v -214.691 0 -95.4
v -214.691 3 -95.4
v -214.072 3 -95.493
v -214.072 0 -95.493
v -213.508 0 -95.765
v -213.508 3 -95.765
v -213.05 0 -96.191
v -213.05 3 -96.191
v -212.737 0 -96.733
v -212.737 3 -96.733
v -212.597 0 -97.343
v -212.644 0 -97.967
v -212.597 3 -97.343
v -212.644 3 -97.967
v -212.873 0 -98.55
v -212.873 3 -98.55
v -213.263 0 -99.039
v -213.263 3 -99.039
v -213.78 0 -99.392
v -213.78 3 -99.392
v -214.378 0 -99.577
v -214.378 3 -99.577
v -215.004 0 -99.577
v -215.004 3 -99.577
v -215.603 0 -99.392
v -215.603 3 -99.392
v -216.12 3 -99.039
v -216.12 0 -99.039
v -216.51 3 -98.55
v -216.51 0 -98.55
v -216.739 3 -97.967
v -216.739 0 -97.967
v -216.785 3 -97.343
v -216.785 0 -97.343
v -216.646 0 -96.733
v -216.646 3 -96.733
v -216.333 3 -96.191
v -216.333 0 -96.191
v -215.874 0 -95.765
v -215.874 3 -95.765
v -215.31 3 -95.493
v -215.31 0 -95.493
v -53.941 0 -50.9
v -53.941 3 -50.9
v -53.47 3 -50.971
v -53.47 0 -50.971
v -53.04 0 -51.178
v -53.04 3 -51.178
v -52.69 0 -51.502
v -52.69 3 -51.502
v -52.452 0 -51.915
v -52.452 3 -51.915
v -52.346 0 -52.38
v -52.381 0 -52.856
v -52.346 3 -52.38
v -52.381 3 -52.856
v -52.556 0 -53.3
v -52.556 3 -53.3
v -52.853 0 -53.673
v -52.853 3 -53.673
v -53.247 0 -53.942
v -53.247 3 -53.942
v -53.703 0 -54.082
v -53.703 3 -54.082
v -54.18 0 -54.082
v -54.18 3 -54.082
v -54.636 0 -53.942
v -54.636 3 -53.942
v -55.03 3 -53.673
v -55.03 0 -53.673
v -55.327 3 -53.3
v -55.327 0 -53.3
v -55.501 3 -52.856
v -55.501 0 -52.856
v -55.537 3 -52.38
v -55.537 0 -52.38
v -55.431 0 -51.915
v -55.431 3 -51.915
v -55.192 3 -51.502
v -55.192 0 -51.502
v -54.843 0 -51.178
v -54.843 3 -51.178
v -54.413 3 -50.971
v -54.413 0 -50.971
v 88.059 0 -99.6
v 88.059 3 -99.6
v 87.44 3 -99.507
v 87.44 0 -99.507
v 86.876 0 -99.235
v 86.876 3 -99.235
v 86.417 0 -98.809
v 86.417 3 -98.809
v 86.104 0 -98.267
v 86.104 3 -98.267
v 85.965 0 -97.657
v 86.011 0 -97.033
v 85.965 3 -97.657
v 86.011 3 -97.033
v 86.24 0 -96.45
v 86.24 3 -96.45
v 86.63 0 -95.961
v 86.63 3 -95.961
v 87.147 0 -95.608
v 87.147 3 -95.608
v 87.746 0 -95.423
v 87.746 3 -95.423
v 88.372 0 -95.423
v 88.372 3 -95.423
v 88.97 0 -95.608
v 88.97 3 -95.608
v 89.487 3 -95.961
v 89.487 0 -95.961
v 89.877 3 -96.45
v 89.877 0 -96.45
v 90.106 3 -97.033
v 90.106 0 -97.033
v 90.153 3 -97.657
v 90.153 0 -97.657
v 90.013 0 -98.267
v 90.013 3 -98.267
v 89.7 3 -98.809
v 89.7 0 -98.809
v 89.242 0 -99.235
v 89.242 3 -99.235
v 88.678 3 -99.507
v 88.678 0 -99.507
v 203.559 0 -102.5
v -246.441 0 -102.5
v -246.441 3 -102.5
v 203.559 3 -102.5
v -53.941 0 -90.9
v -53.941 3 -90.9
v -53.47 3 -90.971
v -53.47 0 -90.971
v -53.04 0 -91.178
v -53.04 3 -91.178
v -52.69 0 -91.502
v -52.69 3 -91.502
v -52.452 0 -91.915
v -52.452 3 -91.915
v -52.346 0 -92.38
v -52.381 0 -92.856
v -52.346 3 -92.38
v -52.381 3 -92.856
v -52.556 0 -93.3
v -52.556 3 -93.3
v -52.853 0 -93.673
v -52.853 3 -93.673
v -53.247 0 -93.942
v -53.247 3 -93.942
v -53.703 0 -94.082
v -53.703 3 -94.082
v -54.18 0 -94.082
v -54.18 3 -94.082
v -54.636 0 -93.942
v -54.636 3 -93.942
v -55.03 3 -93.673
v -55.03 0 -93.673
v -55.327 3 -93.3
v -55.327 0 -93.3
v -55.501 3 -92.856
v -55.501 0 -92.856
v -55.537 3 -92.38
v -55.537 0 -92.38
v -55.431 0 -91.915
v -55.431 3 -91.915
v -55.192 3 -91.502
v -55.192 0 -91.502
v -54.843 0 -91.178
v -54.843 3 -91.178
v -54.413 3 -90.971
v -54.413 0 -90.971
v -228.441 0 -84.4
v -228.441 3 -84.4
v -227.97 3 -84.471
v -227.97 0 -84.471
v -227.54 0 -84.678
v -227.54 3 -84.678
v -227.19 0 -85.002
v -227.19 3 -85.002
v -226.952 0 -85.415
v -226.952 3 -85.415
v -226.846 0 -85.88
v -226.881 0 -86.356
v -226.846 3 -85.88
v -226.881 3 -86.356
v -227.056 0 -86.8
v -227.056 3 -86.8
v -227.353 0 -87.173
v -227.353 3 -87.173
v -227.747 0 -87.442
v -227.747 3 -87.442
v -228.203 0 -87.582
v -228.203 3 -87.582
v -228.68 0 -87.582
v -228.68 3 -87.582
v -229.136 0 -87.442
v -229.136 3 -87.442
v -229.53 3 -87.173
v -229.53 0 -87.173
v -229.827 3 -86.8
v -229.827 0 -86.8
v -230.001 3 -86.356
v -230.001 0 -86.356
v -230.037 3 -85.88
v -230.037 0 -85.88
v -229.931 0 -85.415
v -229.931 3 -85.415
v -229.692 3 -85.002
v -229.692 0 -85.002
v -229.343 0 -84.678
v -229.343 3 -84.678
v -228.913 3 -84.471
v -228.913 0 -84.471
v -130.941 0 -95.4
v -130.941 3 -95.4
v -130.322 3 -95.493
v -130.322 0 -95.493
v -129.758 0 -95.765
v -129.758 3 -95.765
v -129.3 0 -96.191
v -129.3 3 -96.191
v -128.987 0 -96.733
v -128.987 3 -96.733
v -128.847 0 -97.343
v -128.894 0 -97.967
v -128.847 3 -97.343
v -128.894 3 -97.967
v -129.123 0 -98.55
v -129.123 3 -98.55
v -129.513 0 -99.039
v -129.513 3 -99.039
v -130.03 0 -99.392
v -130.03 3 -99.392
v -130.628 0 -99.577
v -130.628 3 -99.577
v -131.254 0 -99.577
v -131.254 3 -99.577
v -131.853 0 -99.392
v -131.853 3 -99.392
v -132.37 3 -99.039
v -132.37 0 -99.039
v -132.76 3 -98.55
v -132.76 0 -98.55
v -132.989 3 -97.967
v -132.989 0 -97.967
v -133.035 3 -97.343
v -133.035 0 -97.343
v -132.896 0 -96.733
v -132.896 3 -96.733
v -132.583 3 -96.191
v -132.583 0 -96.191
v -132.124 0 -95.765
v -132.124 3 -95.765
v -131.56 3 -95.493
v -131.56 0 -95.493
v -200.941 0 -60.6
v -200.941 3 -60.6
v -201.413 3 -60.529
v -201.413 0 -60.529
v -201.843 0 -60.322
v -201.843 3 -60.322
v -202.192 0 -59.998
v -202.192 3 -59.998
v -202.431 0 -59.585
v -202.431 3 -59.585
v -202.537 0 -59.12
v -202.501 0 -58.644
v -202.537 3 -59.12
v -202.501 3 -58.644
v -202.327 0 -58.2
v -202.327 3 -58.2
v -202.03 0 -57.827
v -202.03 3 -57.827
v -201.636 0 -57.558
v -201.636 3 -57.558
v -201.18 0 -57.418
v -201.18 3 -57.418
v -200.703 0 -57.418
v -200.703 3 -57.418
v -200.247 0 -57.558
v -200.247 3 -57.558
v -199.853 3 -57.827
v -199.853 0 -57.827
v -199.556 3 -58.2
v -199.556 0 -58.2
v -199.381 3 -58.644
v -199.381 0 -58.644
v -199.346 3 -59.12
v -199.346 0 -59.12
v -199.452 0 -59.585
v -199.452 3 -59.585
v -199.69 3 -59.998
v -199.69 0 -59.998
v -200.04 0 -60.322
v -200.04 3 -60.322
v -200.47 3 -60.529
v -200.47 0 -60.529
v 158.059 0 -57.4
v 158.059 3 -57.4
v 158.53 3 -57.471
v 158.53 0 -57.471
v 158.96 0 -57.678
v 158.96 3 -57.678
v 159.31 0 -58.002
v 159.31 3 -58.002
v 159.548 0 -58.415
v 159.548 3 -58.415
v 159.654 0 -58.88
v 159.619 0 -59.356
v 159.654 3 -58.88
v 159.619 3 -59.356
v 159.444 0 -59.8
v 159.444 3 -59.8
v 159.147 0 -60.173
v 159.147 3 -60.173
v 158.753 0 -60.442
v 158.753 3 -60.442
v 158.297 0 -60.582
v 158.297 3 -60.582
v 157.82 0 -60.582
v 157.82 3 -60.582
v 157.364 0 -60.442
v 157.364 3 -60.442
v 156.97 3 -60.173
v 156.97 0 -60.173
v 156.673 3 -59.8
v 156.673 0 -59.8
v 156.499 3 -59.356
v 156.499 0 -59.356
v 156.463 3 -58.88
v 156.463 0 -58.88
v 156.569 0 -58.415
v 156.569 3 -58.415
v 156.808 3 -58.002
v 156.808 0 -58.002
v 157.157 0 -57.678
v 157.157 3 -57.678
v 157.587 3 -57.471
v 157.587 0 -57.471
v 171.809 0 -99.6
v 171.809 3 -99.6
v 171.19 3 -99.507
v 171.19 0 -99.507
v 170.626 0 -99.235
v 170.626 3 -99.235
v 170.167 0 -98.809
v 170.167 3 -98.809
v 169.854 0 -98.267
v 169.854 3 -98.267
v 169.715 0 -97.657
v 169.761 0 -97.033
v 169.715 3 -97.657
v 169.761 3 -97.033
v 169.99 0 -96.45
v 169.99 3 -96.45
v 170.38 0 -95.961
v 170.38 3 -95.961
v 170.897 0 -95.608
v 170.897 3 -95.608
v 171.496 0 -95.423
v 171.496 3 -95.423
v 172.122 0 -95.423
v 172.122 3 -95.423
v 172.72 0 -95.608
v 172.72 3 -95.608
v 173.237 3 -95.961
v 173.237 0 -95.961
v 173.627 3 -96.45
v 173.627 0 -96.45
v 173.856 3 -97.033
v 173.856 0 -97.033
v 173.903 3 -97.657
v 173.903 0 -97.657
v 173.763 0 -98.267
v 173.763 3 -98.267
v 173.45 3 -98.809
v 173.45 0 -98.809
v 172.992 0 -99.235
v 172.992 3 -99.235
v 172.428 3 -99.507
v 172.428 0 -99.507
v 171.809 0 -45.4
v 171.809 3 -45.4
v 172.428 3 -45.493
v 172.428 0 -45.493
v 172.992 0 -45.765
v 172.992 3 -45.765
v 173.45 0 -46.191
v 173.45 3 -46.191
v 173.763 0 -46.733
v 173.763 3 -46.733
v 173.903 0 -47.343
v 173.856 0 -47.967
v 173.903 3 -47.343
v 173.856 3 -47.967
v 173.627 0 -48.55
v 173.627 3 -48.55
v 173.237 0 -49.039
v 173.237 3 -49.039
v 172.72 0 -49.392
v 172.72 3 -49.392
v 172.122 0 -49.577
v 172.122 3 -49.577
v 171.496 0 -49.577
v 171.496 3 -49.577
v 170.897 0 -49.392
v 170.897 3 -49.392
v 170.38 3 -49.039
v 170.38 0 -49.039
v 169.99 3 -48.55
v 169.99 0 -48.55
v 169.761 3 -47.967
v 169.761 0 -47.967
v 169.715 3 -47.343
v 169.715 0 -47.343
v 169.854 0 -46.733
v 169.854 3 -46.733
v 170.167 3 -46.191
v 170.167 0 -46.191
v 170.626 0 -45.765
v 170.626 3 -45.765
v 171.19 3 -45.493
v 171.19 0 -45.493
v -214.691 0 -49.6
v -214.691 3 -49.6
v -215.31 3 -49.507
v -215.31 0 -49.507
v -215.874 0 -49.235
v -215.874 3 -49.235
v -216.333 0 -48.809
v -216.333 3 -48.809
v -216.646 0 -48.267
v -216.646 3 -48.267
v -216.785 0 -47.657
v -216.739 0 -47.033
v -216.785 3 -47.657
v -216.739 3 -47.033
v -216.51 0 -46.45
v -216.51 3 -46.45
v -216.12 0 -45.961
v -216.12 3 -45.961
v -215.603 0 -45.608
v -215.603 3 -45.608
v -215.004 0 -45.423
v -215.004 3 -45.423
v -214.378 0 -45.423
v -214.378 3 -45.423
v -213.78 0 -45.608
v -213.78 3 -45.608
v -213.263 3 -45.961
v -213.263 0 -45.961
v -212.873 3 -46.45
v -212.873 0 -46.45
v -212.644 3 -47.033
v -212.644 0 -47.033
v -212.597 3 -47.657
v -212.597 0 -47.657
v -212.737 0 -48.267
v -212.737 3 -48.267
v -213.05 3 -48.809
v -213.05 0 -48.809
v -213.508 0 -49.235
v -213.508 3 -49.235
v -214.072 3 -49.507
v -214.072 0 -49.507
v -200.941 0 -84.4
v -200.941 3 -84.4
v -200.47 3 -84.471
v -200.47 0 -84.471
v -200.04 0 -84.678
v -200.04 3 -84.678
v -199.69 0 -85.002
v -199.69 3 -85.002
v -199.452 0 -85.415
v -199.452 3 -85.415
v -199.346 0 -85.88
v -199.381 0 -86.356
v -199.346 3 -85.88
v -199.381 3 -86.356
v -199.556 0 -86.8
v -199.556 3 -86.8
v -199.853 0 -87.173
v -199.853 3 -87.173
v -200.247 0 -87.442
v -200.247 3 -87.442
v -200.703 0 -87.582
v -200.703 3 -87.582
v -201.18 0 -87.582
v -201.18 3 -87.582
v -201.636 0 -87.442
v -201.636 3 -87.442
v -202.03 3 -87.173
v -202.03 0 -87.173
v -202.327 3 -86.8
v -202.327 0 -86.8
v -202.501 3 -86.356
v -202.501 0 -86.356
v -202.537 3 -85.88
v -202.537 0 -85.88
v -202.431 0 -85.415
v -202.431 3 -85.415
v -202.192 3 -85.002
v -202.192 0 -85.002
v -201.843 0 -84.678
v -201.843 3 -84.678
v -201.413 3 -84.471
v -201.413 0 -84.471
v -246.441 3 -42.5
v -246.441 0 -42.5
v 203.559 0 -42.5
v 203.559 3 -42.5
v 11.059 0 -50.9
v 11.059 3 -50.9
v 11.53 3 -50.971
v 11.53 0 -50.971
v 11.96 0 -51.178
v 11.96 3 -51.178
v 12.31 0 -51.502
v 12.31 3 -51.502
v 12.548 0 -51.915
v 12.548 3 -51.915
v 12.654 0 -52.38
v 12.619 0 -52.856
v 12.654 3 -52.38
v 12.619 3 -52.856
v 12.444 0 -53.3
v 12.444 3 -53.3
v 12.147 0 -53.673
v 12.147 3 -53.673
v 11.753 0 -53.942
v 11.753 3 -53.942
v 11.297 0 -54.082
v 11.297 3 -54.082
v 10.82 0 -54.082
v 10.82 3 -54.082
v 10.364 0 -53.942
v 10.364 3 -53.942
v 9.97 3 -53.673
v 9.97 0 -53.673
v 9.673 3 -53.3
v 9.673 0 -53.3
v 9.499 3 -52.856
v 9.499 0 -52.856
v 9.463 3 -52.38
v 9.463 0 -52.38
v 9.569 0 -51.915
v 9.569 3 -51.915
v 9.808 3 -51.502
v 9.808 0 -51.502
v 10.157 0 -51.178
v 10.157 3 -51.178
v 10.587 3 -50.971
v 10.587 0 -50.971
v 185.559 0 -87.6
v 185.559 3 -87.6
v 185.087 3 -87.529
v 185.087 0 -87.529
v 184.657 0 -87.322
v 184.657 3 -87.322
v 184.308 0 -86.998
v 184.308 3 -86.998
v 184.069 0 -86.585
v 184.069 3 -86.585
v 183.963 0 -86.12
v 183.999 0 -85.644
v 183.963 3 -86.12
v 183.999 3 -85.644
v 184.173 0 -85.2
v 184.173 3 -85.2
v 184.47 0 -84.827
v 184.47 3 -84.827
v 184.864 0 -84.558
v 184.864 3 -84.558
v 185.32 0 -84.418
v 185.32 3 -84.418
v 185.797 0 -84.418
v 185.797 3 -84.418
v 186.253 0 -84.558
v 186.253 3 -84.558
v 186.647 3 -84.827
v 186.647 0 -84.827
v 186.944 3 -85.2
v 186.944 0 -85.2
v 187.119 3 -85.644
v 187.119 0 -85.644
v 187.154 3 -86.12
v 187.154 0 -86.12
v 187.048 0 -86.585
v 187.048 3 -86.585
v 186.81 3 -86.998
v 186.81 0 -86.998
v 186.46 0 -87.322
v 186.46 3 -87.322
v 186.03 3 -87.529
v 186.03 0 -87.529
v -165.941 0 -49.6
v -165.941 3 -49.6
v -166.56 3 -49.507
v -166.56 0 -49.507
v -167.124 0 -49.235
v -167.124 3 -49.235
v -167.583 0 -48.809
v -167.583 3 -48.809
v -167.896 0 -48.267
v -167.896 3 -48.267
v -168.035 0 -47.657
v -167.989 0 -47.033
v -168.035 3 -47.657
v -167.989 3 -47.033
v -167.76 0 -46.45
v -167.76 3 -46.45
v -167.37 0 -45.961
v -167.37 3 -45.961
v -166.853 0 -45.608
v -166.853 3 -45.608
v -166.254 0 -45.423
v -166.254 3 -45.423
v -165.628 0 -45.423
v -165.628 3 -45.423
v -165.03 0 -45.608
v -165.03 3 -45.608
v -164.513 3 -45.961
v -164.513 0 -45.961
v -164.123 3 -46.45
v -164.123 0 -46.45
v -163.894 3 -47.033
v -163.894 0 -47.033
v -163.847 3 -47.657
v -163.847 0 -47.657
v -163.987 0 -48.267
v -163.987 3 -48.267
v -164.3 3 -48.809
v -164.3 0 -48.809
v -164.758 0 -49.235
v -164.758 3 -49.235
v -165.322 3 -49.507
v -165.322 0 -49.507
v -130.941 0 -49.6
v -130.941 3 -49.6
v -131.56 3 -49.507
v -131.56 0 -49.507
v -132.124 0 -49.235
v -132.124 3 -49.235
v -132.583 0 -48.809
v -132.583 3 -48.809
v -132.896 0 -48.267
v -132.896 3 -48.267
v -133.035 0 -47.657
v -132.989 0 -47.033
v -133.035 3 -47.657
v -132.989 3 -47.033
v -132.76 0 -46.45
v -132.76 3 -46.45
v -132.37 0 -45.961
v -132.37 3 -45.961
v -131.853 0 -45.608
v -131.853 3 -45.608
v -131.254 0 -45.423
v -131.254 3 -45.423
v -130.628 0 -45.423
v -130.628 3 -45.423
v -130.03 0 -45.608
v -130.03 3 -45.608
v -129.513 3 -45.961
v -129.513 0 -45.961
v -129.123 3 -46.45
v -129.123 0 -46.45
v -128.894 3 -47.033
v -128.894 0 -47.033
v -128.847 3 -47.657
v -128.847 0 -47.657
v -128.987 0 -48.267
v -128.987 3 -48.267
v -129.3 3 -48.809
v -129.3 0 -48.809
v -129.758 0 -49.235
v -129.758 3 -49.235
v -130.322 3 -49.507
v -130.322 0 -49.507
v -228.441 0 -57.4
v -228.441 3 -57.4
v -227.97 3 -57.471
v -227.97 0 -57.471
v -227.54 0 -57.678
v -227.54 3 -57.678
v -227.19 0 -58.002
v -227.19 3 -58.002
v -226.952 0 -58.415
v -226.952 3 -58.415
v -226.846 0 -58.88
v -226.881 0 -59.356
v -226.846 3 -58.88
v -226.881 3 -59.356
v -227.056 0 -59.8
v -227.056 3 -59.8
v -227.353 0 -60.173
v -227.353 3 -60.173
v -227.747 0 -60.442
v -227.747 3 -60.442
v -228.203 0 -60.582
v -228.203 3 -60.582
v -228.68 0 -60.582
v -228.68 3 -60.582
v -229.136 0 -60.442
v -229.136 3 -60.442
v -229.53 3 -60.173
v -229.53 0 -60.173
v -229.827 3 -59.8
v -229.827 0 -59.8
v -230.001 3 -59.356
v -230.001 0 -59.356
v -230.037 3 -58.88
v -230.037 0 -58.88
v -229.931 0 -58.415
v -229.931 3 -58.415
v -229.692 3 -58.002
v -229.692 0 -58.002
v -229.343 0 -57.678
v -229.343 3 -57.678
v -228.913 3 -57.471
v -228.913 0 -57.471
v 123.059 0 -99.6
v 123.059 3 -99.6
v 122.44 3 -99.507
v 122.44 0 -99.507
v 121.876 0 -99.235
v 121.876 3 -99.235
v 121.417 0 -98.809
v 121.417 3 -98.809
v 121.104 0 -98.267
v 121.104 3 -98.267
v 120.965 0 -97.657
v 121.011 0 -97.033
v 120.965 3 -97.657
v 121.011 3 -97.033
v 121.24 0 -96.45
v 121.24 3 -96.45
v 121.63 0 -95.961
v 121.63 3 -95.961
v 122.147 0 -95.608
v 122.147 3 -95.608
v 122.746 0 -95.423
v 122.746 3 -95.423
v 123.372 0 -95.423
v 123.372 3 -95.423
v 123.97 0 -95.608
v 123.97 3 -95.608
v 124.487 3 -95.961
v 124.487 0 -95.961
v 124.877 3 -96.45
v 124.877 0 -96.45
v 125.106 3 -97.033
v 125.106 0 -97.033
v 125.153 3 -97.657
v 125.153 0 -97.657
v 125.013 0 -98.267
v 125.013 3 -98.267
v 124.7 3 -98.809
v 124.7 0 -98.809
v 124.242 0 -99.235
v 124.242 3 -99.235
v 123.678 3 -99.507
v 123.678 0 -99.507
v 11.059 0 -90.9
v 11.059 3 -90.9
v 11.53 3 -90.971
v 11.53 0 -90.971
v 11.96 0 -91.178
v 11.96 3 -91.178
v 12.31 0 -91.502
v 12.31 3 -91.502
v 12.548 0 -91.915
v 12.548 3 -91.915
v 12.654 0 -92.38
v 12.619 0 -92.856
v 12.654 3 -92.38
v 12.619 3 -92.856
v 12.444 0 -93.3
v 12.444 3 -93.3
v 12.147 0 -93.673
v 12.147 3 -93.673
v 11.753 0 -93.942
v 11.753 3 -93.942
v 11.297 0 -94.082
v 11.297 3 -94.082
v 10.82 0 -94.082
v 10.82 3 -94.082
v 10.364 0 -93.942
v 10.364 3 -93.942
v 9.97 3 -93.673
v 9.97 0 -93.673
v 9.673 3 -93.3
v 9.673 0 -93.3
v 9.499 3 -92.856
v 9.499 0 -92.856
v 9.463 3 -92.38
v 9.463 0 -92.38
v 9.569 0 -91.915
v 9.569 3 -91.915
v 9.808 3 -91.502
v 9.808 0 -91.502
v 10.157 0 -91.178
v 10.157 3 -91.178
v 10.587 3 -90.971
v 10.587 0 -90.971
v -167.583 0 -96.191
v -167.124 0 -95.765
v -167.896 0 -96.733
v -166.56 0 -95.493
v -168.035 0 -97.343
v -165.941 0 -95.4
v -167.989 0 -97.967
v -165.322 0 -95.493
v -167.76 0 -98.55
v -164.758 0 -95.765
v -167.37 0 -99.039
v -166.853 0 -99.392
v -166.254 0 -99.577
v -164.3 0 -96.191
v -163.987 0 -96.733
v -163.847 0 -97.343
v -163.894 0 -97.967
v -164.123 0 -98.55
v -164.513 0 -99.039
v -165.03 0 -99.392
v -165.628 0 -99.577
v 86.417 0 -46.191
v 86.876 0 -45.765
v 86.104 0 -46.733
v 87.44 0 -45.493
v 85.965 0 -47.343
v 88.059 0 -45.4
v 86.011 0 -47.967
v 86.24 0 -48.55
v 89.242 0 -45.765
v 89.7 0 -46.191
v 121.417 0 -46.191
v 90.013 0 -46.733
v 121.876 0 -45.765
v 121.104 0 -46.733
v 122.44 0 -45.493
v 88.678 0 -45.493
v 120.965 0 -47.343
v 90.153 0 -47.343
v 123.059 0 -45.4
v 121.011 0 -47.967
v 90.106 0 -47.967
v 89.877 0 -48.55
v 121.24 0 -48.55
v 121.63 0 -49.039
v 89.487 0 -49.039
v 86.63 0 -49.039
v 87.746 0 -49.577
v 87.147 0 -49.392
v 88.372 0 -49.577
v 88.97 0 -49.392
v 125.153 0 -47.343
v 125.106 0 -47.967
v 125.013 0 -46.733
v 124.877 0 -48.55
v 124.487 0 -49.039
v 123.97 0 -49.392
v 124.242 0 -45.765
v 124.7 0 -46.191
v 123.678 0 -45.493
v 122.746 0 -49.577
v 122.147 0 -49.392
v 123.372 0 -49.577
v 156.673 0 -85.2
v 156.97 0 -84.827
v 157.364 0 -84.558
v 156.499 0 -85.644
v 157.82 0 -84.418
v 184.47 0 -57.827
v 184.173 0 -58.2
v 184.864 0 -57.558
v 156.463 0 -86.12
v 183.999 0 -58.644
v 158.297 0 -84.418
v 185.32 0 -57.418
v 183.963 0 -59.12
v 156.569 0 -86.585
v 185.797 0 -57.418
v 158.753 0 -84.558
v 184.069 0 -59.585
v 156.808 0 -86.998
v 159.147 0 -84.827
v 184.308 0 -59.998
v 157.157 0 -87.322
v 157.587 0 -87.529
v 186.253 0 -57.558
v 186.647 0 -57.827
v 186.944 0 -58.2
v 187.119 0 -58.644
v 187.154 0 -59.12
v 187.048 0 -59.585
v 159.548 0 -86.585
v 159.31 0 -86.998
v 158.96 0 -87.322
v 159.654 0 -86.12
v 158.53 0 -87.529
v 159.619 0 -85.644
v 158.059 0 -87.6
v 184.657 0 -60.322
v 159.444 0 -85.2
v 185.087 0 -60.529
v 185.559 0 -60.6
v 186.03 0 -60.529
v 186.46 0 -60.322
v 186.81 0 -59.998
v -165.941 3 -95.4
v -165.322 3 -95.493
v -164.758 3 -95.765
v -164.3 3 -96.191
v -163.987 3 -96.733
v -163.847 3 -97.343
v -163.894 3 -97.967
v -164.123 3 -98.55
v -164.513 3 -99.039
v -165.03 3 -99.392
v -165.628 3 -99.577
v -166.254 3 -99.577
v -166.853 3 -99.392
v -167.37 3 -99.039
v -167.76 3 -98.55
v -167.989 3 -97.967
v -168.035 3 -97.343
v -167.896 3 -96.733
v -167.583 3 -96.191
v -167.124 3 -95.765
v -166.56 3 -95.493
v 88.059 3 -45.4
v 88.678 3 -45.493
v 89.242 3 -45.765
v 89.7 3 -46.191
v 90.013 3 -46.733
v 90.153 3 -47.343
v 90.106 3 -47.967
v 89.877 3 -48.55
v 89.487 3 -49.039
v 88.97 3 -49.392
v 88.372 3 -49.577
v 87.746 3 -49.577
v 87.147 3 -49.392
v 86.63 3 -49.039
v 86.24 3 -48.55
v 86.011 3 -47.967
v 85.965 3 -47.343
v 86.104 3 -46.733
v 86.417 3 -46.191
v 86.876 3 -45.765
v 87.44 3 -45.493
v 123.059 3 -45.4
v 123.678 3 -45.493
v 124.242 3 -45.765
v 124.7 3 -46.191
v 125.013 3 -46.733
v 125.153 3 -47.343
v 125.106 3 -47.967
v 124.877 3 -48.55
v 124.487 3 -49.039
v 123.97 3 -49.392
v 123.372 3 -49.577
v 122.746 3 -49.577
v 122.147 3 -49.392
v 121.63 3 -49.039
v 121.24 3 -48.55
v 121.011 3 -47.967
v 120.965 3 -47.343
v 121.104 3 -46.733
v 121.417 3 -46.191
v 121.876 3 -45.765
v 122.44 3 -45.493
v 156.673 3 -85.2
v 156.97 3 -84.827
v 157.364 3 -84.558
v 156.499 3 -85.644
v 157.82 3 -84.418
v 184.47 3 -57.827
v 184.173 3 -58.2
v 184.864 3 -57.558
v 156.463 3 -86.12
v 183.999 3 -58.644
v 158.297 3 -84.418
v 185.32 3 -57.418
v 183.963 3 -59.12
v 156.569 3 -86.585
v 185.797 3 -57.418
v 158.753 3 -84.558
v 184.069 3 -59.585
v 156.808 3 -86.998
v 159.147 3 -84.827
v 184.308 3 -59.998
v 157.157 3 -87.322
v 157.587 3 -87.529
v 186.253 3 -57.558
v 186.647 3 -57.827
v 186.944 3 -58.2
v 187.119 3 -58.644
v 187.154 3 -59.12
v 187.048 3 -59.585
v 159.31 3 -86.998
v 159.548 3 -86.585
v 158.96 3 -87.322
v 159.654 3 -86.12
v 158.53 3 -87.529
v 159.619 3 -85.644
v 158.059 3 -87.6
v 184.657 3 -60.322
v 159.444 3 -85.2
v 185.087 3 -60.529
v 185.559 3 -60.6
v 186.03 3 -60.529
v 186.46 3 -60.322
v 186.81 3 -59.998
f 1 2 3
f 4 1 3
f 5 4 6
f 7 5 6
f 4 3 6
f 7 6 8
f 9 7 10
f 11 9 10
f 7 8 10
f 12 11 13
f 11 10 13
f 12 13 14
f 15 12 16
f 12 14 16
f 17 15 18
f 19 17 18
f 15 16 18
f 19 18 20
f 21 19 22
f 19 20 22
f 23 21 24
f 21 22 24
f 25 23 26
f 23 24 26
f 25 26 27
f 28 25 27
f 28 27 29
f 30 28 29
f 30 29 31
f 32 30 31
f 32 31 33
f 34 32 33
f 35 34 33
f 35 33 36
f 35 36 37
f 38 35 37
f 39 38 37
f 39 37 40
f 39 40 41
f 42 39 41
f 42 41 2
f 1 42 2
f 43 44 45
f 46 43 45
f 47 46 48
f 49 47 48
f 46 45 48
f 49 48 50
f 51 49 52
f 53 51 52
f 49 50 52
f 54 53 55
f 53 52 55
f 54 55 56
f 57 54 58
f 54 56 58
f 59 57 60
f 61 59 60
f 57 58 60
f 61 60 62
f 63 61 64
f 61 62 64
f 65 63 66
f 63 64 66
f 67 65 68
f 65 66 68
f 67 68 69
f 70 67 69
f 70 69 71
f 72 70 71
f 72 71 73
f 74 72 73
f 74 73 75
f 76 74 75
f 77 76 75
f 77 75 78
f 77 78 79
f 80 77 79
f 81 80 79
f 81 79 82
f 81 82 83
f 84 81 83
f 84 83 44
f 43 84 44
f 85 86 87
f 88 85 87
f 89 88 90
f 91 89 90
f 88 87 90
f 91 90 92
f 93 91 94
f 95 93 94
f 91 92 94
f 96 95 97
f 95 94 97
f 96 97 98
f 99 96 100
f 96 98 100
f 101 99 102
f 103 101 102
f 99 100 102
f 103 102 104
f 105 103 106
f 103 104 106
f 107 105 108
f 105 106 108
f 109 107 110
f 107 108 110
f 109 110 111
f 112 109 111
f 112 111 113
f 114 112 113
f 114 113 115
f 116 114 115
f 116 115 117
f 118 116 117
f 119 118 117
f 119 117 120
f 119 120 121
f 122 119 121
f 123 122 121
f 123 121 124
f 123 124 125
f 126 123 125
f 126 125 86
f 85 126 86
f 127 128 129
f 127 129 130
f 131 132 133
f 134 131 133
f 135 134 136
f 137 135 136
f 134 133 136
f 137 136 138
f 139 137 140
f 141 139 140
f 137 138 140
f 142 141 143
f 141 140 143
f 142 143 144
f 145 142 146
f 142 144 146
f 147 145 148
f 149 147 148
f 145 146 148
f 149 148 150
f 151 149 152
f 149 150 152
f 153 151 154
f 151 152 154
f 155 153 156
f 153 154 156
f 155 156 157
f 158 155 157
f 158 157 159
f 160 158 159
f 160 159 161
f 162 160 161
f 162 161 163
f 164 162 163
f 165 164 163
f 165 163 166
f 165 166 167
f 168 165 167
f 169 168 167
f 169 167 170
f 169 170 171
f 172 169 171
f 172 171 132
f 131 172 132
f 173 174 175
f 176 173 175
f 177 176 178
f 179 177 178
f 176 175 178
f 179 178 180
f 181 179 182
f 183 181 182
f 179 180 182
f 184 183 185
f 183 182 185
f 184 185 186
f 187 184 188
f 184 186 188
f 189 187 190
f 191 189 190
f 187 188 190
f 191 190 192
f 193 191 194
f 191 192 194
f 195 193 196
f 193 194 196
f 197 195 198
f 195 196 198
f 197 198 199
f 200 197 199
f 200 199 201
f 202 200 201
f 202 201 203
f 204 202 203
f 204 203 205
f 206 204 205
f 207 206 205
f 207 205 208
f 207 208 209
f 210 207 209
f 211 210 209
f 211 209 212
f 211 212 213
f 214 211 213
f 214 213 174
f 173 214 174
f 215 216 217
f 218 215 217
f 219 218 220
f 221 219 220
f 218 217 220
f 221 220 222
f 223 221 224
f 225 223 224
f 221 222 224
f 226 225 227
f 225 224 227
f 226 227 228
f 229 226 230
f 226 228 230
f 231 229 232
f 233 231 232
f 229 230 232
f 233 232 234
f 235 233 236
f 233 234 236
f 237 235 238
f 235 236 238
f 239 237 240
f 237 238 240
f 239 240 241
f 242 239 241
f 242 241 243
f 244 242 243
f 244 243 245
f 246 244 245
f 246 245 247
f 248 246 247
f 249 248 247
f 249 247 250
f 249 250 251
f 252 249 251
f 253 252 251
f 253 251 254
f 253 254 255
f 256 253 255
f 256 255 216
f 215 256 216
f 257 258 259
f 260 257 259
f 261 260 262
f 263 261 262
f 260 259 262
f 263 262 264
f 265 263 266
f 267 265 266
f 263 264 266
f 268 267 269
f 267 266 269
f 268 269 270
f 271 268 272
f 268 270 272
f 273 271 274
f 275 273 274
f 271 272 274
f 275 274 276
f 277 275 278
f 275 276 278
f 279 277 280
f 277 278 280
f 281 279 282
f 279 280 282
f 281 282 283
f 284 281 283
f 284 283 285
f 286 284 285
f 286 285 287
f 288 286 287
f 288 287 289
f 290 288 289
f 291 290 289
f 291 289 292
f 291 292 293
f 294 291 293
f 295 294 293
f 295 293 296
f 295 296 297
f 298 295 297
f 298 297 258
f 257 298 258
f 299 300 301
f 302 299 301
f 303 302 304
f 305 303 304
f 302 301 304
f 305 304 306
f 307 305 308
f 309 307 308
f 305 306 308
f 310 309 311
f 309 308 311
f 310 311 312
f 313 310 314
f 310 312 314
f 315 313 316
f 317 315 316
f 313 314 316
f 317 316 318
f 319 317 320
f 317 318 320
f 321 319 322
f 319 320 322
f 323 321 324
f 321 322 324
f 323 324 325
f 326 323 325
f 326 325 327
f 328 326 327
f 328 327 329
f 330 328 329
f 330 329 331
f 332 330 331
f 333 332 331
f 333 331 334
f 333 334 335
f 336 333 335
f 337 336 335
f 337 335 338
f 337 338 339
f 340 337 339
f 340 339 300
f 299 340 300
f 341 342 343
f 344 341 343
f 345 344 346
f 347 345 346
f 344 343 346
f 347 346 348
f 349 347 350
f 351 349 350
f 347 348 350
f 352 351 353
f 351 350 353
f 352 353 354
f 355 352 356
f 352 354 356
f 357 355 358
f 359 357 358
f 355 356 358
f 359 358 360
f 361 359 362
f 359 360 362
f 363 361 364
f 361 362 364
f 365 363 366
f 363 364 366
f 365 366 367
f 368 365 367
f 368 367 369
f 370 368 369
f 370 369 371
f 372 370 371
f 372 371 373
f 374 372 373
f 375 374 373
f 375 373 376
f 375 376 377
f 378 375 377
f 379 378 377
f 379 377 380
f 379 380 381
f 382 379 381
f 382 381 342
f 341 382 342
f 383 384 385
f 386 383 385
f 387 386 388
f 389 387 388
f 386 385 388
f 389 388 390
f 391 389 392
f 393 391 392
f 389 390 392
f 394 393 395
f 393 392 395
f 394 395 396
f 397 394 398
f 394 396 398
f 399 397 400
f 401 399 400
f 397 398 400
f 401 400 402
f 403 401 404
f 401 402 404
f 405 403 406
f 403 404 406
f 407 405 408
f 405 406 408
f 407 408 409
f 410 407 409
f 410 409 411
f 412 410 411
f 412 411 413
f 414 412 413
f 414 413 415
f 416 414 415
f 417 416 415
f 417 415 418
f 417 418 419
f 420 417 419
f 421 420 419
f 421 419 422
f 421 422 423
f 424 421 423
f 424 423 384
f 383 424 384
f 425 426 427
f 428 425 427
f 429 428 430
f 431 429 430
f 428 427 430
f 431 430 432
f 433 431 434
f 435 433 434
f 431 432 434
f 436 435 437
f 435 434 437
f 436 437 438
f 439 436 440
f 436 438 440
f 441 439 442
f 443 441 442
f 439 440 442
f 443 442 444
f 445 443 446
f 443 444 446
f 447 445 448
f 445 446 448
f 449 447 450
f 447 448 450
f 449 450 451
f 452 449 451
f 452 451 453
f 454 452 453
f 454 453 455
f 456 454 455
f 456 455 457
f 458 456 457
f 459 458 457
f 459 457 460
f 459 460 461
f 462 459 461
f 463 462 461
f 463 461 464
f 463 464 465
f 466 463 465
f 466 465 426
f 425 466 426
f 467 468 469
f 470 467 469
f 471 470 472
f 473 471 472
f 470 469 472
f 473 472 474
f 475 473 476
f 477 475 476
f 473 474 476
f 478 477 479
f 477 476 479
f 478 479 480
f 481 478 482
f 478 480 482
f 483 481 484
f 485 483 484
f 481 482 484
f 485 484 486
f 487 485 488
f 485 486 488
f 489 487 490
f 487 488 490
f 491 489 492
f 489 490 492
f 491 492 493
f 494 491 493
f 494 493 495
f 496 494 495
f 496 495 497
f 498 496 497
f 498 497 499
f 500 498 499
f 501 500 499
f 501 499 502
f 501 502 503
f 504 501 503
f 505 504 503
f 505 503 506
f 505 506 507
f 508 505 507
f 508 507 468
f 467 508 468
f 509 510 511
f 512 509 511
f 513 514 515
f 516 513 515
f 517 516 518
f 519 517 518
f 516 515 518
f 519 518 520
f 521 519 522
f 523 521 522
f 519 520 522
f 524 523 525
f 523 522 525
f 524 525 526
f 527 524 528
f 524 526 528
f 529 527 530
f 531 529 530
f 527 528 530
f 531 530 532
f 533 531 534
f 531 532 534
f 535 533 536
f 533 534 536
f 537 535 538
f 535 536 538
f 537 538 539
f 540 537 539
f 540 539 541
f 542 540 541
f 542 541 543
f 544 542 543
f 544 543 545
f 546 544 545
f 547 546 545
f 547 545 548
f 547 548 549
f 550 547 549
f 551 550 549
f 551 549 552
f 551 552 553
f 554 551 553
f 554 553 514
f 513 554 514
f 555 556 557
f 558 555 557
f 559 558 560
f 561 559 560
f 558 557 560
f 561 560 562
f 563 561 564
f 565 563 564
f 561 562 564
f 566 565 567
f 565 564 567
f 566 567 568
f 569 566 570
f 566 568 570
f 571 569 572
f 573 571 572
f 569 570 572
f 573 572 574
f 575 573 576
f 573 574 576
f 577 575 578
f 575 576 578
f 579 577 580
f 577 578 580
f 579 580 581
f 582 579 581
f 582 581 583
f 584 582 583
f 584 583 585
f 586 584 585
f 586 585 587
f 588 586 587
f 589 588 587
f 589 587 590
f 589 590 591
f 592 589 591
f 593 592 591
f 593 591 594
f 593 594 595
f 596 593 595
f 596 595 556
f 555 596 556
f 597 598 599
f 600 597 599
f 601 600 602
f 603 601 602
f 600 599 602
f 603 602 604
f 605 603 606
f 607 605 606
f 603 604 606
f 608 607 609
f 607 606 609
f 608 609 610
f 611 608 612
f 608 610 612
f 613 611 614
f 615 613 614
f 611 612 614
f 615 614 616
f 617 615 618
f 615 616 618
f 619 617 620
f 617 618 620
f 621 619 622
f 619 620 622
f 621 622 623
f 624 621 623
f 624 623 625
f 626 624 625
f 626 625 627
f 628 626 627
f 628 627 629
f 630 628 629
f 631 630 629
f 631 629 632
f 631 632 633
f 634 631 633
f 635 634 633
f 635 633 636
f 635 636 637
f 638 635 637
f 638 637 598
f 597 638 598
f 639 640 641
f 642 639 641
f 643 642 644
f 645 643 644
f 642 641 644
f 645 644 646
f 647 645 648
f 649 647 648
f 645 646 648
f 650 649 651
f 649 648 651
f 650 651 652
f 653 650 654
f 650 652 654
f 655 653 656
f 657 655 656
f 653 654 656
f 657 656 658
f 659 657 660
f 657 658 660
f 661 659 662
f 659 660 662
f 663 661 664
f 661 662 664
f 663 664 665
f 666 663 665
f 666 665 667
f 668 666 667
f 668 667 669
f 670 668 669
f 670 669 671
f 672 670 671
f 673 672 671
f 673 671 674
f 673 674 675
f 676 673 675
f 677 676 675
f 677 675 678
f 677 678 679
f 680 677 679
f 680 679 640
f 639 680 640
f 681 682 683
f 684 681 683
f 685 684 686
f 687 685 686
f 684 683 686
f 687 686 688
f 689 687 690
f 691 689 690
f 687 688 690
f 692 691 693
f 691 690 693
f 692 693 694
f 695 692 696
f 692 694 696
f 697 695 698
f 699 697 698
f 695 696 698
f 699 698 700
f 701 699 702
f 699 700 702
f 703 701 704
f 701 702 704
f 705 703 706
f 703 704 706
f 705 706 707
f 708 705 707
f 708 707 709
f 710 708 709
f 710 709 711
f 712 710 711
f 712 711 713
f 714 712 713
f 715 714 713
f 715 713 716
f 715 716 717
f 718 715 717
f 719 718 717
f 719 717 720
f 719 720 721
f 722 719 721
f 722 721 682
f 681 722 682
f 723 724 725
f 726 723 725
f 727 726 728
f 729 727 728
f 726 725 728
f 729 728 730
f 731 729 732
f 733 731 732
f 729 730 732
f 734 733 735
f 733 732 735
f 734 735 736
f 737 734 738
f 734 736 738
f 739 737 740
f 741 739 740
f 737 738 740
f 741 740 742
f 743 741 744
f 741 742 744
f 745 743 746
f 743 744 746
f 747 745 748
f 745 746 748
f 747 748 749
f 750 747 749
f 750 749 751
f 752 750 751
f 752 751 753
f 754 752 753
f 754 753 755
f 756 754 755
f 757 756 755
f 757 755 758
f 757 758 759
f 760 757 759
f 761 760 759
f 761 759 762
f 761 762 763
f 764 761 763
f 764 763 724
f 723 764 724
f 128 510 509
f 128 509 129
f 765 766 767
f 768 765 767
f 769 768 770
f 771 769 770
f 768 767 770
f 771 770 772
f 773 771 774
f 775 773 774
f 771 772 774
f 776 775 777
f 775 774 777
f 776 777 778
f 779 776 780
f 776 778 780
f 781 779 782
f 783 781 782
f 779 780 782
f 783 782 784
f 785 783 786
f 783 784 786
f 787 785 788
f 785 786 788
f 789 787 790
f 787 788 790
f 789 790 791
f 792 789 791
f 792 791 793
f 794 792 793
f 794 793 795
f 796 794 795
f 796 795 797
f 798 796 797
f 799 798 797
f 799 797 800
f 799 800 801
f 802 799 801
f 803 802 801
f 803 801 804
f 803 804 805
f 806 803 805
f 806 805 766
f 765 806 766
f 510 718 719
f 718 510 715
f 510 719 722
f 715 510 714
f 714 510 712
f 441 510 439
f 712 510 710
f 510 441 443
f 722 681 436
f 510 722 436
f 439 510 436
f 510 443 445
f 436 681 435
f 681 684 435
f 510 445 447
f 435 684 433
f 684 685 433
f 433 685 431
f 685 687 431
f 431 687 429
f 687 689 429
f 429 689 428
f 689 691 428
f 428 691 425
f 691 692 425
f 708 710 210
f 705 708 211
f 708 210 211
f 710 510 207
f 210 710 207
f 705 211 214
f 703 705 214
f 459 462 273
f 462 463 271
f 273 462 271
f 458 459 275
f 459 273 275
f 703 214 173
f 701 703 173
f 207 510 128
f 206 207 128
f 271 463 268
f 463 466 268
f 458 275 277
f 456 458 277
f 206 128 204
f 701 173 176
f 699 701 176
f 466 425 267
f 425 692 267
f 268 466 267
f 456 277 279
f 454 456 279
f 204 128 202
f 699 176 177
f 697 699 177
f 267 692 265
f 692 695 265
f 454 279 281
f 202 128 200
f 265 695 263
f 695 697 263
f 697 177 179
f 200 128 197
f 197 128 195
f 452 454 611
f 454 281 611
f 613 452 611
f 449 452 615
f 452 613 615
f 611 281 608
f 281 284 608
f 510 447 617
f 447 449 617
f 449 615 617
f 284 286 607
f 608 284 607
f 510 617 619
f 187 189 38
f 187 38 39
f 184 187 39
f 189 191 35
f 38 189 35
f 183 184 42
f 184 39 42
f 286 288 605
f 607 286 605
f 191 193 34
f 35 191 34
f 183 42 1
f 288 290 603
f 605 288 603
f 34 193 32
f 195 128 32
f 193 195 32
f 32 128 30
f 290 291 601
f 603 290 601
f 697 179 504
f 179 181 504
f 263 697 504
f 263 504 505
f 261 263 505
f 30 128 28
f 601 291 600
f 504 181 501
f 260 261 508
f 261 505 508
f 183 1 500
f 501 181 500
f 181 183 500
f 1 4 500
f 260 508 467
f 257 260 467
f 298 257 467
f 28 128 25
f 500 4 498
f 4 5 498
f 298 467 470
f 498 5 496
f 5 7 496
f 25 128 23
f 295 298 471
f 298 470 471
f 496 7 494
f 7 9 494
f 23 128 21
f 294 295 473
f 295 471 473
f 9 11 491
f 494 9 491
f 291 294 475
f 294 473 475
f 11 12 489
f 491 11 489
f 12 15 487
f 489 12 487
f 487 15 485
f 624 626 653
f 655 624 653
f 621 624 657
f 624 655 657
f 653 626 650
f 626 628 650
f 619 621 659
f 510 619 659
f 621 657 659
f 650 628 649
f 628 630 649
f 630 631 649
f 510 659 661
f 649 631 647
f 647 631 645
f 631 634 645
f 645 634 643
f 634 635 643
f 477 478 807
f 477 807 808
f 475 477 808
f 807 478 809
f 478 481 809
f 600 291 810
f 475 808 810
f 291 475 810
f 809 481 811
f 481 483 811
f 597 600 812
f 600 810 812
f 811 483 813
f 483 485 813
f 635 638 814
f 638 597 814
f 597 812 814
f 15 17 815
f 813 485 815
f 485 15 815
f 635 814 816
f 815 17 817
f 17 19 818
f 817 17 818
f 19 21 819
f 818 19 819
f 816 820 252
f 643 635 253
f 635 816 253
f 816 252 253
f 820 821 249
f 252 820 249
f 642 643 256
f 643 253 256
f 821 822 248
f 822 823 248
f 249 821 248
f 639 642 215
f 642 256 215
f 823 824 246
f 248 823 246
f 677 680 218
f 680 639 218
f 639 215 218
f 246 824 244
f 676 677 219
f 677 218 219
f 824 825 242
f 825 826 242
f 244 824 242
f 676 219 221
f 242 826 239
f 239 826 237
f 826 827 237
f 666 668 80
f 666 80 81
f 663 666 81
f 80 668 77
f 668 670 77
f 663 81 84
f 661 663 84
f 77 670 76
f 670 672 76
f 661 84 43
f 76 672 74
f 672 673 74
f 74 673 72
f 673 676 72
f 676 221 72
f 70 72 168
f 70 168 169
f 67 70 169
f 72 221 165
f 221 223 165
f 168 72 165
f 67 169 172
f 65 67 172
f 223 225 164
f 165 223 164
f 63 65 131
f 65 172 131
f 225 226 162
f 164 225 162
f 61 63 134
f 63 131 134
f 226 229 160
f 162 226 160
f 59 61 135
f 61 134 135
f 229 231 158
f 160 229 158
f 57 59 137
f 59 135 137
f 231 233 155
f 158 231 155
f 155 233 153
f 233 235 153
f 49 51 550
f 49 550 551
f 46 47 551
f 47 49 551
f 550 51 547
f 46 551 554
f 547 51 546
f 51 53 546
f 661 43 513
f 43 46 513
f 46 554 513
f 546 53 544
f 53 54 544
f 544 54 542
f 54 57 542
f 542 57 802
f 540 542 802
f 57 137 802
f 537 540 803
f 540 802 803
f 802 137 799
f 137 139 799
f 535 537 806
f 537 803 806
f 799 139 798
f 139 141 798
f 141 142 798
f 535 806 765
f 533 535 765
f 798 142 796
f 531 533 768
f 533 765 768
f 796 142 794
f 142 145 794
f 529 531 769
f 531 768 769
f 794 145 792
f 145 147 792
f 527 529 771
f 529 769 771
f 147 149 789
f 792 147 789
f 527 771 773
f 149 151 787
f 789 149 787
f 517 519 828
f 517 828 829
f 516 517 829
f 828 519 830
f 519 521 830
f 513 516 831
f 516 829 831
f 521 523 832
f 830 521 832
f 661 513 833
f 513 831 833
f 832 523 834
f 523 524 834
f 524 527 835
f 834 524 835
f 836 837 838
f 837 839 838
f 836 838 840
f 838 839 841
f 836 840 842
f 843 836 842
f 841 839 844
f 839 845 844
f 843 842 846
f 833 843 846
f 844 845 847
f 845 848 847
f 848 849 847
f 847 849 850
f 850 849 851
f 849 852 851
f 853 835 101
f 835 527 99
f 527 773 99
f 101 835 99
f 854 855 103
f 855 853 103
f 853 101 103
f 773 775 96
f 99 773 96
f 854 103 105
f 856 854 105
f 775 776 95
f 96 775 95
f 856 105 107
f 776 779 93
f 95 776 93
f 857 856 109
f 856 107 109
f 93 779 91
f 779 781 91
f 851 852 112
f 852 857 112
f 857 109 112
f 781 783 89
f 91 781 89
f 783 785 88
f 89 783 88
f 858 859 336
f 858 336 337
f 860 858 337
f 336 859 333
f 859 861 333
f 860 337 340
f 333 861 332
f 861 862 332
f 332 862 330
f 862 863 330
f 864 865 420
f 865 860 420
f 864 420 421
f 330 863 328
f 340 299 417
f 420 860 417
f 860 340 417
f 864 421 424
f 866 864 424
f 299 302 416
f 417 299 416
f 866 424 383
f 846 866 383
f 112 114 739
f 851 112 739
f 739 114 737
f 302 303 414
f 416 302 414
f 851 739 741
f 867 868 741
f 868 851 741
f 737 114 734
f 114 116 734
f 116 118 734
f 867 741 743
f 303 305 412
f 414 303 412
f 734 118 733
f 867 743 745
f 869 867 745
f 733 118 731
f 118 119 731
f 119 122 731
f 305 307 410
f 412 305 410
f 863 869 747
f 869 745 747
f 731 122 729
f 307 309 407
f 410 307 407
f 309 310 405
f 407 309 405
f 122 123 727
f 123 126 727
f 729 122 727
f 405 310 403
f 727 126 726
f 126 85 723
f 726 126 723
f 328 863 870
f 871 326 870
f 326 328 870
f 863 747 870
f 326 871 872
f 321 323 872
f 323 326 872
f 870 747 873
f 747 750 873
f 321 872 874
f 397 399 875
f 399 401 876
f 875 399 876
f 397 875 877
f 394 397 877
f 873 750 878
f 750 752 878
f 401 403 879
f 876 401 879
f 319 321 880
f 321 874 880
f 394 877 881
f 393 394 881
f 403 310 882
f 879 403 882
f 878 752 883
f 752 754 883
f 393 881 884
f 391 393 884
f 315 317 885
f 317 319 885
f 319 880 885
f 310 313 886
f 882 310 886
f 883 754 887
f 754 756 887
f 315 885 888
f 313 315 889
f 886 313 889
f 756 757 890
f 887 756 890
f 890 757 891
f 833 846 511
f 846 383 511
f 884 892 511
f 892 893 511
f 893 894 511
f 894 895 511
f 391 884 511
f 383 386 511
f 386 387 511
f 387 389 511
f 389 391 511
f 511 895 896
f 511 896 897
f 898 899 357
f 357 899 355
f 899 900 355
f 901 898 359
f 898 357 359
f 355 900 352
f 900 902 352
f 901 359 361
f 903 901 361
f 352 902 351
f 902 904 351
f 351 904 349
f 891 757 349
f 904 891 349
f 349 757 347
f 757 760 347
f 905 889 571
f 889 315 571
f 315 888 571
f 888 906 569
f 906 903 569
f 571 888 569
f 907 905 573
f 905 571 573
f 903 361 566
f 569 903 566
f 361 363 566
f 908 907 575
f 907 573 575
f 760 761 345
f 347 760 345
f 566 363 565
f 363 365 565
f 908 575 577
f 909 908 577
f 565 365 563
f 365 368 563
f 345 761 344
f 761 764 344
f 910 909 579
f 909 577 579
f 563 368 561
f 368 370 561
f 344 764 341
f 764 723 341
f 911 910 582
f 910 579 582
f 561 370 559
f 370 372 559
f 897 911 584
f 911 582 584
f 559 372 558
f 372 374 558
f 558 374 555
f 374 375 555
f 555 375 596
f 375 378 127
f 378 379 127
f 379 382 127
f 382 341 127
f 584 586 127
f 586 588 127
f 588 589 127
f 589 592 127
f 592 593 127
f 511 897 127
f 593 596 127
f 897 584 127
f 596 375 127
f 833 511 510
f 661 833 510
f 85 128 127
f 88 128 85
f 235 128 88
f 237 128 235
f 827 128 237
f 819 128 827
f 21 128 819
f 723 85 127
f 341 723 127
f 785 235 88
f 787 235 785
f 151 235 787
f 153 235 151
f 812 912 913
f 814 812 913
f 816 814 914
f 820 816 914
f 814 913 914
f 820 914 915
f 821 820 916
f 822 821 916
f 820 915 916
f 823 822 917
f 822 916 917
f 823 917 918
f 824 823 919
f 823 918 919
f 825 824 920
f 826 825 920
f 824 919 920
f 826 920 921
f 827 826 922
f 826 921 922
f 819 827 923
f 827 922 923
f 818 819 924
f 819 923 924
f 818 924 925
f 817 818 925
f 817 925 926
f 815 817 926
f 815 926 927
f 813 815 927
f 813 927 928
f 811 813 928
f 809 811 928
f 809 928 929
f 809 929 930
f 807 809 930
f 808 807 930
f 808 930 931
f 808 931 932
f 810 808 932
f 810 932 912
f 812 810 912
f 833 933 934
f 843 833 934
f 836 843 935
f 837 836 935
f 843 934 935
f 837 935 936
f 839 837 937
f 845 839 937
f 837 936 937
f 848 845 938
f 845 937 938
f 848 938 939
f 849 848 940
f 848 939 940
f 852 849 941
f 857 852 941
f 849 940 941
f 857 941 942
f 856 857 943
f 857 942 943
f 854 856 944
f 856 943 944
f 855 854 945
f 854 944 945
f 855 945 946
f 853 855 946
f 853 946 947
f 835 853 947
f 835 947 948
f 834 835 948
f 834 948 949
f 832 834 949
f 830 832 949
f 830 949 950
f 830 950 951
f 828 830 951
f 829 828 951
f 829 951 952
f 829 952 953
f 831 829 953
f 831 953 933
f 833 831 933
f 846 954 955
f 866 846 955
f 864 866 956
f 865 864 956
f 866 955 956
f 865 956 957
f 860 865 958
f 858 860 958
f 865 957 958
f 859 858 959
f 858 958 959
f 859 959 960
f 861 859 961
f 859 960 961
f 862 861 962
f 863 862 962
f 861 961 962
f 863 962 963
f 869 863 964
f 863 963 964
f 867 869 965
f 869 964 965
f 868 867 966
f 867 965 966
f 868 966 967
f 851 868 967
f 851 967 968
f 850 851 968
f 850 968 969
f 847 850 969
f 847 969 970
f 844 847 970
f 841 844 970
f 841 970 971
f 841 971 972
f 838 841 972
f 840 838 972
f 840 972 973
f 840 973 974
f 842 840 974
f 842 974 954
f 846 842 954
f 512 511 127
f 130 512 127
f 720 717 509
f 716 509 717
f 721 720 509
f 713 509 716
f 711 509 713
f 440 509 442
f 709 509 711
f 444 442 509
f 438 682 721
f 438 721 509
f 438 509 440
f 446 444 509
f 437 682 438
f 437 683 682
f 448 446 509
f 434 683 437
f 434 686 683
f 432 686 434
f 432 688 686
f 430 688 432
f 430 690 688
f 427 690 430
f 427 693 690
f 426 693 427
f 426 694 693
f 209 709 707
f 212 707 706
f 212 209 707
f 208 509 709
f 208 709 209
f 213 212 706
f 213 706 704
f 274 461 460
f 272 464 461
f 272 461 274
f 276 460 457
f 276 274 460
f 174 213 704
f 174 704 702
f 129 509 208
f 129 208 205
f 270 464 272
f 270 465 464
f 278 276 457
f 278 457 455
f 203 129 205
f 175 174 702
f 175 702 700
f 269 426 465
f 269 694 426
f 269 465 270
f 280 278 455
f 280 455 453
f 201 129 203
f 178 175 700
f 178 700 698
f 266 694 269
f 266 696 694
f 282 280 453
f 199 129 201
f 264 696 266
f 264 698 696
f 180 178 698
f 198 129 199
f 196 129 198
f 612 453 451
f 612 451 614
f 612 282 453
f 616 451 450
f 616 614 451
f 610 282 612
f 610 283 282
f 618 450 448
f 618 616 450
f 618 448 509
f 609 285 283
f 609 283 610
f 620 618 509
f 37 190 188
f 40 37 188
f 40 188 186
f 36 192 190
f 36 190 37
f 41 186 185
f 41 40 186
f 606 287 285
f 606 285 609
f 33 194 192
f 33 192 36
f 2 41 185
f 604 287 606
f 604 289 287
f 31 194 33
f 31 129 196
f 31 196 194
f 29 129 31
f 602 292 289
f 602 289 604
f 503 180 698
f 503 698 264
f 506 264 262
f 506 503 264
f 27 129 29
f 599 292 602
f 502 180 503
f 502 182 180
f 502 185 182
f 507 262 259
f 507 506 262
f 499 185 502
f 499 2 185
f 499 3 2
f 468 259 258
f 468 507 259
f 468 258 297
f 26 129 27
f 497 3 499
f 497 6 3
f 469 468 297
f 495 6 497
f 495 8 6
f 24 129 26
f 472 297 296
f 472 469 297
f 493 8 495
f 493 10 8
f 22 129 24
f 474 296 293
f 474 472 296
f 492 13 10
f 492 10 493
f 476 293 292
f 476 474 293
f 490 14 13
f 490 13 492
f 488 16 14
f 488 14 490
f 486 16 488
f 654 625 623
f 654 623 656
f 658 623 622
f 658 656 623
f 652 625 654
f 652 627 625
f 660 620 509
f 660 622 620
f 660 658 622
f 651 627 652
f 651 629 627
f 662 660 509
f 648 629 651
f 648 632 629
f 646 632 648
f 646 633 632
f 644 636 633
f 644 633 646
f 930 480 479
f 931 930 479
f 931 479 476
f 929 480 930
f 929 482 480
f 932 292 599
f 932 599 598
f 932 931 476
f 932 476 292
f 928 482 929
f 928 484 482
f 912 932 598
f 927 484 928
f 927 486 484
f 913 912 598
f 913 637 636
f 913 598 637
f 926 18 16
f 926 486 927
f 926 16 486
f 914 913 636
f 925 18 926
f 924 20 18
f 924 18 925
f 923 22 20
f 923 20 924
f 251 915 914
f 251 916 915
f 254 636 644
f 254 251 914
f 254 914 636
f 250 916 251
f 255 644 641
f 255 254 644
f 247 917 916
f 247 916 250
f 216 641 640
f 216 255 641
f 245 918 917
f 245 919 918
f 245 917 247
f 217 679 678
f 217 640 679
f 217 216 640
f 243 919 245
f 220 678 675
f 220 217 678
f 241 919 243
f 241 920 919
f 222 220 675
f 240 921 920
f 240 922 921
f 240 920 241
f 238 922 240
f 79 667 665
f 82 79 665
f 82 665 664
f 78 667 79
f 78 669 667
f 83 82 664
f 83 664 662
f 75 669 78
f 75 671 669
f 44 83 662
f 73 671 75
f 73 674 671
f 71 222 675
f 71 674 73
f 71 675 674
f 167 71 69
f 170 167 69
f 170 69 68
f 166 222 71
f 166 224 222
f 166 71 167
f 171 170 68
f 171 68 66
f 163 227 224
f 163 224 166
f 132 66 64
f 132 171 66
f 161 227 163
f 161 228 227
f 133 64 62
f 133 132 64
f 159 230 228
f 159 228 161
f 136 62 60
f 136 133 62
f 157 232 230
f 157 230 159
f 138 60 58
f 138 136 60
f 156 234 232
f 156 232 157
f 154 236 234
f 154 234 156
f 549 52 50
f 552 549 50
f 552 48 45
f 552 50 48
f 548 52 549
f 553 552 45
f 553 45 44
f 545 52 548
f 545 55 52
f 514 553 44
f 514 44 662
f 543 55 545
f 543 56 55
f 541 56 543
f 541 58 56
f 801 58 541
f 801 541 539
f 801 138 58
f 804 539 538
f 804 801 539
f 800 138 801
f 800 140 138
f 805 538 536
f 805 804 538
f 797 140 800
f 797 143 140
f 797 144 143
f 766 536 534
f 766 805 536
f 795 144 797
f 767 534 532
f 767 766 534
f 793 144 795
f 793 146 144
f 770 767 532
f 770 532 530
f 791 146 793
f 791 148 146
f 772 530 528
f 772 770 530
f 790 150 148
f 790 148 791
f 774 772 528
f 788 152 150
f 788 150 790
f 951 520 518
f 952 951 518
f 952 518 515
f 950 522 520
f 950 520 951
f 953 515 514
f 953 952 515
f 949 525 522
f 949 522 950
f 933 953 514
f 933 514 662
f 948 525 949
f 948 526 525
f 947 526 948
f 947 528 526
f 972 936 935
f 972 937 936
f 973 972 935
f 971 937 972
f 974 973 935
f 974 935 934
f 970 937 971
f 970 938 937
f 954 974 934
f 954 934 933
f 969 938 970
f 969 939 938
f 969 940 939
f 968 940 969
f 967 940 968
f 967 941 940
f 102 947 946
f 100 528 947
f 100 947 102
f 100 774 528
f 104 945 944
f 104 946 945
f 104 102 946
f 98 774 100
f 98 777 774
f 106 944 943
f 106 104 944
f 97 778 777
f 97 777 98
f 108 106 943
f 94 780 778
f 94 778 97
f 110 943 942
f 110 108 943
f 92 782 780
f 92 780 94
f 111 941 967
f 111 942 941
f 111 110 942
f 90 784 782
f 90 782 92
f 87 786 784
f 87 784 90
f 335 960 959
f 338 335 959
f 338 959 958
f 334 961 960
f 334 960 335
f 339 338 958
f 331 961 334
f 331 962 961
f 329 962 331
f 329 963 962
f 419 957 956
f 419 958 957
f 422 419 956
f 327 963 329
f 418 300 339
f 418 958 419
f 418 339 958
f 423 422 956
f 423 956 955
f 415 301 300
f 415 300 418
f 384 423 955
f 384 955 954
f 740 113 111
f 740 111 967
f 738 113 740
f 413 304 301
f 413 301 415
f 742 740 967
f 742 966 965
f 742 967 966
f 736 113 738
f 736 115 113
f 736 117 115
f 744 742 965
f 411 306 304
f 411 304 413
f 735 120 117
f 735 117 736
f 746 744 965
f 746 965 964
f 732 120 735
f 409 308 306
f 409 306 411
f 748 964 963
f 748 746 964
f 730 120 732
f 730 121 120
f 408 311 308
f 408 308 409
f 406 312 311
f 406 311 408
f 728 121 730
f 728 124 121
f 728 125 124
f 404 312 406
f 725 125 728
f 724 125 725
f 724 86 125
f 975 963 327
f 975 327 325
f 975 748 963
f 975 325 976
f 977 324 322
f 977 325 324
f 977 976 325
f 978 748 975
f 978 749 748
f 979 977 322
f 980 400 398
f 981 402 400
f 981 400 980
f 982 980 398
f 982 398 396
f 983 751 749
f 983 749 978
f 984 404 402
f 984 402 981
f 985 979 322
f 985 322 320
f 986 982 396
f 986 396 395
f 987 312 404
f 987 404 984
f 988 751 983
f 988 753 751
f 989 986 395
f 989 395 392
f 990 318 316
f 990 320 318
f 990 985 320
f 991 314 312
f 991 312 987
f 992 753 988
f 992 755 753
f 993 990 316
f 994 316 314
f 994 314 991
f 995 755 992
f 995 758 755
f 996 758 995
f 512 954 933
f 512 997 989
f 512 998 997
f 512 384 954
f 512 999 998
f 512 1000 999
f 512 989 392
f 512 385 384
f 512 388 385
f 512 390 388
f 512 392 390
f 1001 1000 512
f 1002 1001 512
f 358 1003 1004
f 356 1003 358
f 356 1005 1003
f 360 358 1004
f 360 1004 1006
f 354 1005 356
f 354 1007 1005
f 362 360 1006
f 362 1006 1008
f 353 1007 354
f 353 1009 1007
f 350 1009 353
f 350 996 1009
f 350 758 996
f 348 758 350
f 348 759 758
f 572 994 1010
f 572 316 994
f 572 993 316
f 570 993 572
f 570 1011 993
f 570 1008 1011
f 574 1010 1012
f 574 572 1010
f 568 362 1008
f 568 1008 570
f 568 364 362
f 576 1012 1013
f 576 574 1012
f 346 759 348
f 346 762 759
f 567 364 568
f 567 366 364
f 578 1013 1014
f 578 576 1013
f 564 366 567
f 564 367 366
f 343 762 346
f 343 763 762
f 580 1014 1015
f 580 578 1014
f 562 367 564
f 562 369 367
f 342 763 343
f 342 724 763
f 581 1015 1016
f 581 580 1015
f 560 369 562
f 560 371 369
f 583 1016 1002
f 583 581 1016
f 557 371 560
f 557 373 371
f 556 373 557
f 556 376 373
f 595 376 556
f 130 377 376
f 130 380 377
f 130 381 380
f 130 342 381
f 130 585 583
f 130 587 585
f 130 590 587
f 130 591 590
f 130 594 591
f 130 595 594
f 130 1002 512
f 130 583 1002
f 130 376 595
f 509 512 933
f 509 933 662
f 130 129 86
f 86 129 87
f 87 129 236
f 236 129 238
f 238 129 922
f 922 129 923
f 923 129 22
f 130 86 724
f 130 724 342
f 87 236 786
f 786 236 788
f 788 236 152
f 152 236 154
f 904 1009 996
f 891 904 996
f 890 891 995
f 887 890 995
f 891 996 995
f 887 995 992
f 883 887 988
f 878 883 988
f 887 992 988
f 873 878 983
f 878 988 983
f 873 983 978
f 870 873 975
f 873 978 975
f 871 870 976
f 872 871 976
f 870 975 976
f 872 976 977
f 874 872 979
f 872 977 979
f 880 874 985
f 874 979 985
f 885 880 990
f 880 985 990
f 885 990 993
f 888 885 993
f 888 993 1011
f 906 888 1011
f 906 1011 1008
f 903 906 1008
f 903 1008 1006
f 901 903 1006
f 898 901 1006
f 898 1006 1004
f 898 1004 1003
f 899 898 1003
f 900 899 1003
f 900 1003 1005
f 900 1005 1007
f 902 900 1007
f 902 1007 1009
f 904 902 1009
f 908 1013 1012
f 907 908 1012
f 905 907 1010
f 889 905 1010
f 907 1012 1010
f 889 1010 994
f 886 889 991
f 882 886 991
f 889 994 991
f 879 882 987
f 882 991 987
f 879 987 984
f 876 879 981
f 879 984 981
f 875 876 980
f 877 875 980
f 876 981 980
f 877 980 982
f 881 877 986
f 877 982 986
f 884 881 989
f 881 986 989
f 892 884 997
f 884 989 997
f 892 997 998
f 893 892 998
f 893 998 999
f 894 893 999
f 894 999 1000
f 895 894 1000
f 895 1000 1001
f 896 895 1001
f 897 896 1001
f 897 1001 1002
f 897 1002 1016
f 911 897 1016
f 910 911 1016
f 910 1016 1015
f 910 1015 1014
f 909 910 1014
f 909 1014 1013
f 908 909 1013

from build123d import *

# Parameters (mm, degrees)
SKETCH_1_W             = 450
SKETCH_1_H             = 60
EXTRUDE_1_DEPTH        = 3
SKETCH_2_R             = 1.6
SKETCH_2_R_2           = 2.1
CUT_EXTRUDE_1_DEPTH    = 267.924326413
SKETCH_3_R             = 1.6
CUT_EXTRUDE_1724_DEPTH = 10


with BuildPart() as part:
    # 草图1 → 凸台-拉伸1 (new body)
    with BuildSketch(Plane(origin=(0, 0, 0), x_dir=(1, 0, 0), z_dir=(0, 1, 0))):
        with Locations((-21.441364286, 72.5)):
            Rectangle(SKETCH_1_W, SKETCH_1_H)
    extrude(amount=EXTRUDE_1_DEPTH)

    # 草图2 → 切除-拉伸1 (cut, through all)
    with BuildSketch(Plane(origin=(0, 3, 0), x_dir=(1, 0, 0), z_dir=(0, 1, 0))):
        with Locations(Location((-228.441364286, 86, 0), (0, 0, 270))):
            Circle(SKETCH_2_R)
        with Locations(Location((-228.441364286, 59, 0), (0, 0, 270))):
            Circle(SKETCH_2_R)
        with Locations(Location((-200.941364286, 86, 0), (0, 0, 270))):
            Circle(SKETCH_2_R)
        with Locations(Location((-200.941364286, 59, 0), (0, 0, 90))):
            Circle(SKETCH_2_R)
        with Locations(Location((-130.941364286, 97.5, 0), (0, 0, 270))):
            Circle(SKETCH_2_R_2)
        with Locations(Location((-165.941364286, 97.5, 0), (0, 0, 270))):
            Circle(SKETCH_2_R_2)
        with Locations(Location((-130.941364286, 47.5, 0), (0, 0, 90))):
            Circle(SKETCH_2_R_2)
        with Locations(Location((-165.941364286, 47.5, 0), (0, 0, 90))):
            Circle(SKETCH_2_R_2)
        with Locations(Location((-214.691364286, 97.5, 0), (0, 0, 270))):
            Circle(SKETCH_2_R_2)
        with Locations(Location((-214.691364286, 47.5, 0), (0, 0, 90))):
            Circle(SKETCH_2_R_2)
        with Locations(Location((158.058635714, 86, 0), (0, 0, 90))):
            Circle(SKETCH_2_R)
        with Locations(Location((171.808635714, 47.5, 0), (0, 0, 270))):
            Circle(SKETCH_2_R_2)
        with Locations(Location((185.558635714, 59, 0), (0, 0, 90))):
            Circle(SKETCH_2_R)
        with Locations(Location((158.058635714, 59, 0), (0, 0, 270))):
            Circle(SKETCH_2_R)
        with Locations(Location((123.058635714, 47.5, 0), (0, 0, 270))):
            Circle(SKETCH_2_R_2)
        with Locations(Location((88.058635714, 47.5, 0), (0, 0, 270))):
            Circle(SKETCH_2_R_2)
        with Locations(Location((88.058635714, 97.5, 0), (0, 0, 90))):
            Circle(SKETCH_2_R_2)
        with Locations(Location((123.058635714, 97.5, 0), (0, 0, 90))):
            Circle(SKETCH_2_R_2)
        with Locations(Location((171.808635714, 97.5, 0), (0, 0, 90))):
            Circle(SKETCH_2_R_2)
        with Locations(Location((185.558635714, 86, 0), (0, 0, 90))):
            Circle(SKETCH_2_R)
    extrude(amount=-CUT_EXTRUDE_1_DEPTH, mode=Mode.SUBTRACT)

    # 草图3 → Cut-Extrude 1724 (cut)
    with BuildSketch(Plane(origin=(0, 3, 0), x_dir=(1, 0, 0), z_dir=(0, 1, 0))):
        with Locations(Location((-53.941364286, 92.5, 0), (0, 0, 270))):
            Circle(SKETCH_3_R)
        with Locations(Location((11.058635714, 92.5, 0), (0, 0, 270))):
            Circle(SKETCH_3_R)
        with Locations(Location((11.058635714, 52.5, 0), (0, 0, 270))):
            Circle(SKETCH_3_R)
        with Locations(Location((-53.941364286, 52.5, 0), (0, 0, 270))):
            Circle(SKETCH_3_R)
    extrude(amount=-CUT_EXTRUDE_1724_DEPTH, mode=Mode.SUBTRACT)


solid = part.part
